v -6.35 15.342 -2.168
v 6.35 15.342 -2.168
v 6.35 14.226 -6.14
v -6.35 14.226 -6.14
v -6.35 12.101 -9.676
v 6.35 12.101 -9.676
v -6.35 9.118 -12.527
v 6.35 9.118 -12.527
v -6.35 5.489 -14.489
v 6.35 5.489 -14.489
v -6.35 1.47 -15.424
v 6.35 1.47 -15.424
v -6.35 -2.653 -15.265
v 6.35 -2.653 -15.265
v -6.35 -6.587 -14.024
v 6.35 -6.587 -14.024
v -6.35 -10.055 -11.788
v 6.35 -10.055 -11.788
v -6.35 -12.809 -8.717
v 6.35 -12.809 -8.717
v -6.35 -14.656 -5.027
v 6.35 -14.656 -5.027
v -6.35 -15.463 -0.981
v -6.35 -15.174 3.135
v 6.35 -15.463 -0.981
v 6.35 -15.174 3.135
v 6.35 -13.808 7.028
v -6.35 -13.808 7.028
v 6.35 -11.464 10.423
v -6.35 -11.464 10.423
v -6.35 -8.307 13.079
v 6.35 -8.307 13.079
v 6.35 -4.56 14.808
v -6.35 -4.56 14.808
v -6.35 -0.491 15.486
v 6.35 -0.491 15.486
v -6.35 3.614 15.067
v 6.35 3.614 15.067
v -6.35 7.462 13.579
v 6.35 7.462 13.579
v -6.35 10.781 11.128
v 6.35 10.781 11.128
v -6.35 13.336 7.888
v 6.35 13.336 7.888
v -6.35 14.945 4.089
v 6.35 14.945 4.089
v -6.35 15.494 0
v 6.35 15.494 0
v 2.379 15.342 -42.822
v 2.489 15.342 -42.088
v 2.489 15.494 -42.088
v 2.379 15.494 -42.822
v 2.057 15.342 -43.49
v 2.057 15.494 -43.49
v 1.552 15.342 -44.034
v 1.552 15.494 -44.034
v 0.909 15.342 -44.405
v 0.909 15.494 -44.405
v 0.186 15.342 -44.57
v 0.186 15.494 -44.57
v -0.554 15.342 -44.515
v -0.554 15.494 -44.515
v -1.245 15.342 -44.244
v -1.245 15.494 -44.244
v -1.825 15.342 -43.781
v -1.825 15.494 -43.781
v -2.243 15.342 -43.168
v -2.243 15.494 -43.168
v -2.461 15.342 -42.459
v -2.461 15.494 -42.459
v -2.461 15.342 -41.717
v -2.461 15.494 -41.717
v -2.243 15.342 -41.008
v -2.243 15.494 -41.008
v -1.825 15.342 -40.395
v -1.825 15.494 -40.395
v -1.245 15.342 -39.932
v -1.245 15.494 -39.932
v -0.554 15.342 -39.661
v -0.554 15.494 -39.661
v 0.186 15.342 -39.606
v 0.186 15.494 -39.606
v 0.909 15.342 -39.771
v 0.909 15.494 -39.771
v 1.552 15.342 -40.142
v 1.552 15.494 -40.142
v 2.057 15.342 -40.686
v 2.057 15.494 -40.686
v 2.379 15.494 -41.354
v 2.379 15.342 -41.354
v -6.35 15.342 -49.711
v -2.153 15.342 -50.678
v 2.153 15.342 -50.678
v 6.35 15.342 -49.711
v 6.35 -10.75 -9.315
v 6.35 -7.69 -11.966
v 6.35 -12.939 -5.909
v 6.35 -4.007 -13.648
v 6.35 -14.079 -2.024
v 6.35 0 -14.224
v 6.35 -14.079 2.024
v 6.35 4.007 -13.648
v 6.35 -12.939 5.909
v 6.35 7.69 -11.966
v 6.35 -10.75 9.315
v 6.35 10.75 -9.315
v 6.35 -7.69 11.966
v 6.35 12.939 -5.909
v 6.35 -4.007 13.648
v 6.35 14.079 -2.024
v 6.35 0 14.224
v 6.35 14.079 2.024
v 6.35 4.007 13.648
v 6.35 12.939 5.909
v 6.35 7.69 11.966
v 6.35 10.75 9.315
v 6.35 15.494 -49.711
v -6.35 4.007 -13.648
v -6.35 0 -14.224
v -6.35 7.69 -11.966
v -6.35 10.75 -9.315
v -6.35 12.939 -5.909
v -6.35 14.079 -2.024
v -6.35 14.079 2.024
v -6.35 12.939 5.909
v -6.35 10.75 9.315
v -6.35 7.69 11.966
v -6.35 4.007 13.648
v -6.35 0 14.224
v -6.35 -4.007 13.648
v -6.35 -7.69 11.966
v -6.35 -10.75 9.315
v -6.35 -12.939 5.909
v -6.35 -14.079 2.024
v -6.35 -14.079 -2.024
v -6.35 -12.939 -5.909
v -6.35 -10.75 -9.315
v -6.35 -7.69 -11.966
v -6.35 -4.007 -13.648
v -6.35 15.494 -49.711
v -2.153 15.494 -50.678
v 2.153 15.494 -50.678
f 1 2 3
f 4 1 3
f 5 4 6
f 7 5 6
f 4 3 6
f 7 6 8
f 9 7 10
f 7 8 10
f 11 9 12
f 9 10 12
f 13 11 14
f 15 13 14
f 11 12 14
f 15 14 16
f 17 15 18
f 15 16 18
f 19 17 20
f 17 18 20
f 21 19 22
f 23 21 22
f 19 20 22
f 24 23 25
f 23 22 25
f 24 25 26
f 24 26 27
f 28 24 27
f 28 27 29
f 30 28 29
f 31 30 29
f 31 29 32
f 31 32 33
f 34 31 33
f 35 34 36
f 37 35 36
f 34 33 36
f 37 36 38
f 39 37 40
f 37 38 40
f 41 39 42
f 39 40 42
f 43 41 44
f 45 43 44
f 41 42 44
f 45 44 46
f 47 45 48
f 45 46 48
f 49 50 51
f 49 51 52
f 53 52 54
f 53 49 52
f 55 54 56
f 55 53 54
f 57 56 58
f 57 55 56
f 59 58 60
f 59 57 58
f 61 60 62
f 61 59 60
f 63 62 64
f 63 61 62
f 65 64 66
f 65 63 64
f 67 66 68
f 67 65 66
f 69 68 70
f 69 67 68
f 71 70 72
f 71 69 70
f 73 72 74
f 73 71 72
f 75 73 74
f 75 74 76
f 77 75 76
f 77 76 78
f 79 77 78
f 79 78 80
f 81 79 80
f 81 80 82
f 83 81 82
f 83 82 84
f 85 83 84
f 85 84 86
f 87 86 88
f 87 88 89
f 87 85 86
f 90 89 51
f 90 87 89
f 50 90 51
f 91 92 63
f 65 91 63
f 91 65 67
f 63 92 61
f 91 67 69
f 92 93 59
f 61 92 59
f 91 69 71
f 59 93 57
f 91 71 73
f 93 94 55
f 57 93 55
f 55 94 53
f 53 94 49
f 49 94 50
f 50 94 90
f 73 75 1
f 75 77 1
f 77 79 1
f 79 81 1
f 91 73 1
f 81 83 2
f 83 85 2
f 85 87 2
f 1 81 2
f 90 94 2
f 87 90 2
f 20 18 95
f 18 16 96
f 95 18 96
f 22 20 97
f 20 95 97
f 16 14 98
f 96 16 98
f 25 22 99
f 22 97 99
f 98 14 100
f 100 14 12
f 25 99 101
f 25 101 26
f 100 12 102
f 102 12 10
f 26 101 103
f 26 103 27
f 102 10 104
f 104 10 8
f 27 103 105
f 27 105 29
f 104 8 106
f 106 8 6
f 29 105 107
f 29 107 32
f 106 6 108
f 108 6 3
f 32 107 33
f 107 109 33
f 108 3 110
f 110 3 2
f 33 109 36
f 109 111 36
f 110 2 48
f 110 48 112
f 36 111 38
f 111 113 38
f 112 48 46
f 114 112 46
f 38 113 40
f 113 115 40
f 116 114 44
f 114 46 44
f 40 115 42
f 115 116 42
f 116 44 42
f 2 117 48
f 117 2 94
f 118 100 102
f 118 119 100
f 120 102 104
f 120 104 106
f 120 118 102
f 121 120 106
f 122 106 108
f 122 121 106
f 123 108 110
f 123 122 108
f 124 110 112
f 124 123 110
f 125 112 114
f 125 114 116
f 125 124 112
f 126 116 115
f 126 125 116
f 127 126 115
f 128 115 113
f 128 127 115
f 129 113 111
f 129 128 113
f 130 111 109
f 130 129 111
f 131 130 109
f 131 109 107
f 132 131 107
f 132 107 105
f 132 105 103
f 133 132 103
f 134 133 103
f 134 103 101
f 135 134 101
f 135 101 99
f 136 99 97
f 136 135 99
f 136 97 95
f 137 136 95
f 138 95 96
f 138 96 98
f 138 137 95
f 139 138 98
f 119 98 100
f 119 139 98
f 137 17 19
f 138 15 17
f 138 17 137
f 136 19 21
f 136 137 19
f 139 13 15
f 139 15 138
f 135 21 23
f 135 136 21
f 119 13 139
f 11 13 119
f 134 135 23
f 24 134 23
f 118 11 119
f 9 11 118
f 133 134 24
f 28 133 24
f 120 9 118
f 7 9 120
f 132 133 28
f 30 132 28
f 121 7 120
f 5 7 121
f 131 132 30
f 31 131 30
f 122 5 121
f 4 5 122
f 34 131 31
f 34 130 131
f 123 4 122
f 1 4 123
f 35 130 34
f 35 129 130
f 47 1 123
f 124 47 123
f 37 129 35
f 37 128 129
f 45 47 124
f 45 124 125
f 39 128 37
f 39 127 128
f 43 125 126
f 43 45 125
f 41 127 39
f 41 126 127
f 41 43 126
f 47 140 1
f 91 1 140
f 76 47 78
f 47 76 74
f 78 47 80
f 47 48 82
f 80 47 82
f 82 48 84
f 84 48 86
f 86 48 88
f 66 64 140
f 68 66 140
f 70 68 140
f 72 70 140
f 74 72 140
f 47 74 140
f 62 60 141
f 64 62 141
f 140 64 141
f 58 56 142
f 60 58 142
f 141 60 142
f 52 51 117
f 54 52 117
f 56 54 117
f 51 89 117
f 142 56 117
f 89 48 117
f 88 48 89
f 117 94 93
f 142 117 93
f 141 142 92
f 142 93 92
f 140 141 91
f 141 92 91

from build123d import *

# Parameters (mm, degrees)
SKETCH1_R           = 14.224
BOSS_EXTRUDE1_DEPTH = 6.35
ONEHOLE_START       = -0.1524
SKETCH2_R           = 2.4892
ONEHOLE_DEPTH       = 0.1524


with BuildPart() as part:
    # Sketch1 → Boss-Extrude1 (new body, symmetric)
    with BuildSketch(Plane(origin=(0, 0, 0), x_dir=(0, 0, -1), z_dir=(1, 0, 0))):
        with BuildLine():
            Line((0, 15.494), (50.8, 15.494))
            Line((50.8, 15.494), (50.8, 15.3416))
            Line((50.8, 15.3416), (2.167797371, 15.3416))
            ThreePointArc((2.167797371, 15.3416), (-1.086573882, -15.45585304), (0, 15.494))
        make_face()
        Circle(SKETCH1_R, mode=Mode.SUBTRACT)
    extrude(amount=BOSS_EXTRUDE1_DEPTH, both=True)

    # Sketch2 → OneHole (cut)
    with BuildSketch(Plane(origin=(0, 15.494, 0), x_dir=(1, 0, 0), z_dir=(0, 1, 0)).offset(ONEHOLE_START)):
        with Locations((0, 42.0878)):
            Circle(SKETCH2_R)
        with BuildLine():
            Line((-6.35, 49.710512242), (-6.35, 51.435))
            Line((-6.35, 51.435), (6.35, 51.435))
            Line((6.35, 51.435), (6.35, 49.710512242))
            ThreePointArc((6.35, 49.710512242), (0, 50.8), (-6.35, 49.710512242))
        make_face()
    extrude(amount=ONEHOLE_DEPTH, mode=Mode.SUBTRACT)


solid = part.part
